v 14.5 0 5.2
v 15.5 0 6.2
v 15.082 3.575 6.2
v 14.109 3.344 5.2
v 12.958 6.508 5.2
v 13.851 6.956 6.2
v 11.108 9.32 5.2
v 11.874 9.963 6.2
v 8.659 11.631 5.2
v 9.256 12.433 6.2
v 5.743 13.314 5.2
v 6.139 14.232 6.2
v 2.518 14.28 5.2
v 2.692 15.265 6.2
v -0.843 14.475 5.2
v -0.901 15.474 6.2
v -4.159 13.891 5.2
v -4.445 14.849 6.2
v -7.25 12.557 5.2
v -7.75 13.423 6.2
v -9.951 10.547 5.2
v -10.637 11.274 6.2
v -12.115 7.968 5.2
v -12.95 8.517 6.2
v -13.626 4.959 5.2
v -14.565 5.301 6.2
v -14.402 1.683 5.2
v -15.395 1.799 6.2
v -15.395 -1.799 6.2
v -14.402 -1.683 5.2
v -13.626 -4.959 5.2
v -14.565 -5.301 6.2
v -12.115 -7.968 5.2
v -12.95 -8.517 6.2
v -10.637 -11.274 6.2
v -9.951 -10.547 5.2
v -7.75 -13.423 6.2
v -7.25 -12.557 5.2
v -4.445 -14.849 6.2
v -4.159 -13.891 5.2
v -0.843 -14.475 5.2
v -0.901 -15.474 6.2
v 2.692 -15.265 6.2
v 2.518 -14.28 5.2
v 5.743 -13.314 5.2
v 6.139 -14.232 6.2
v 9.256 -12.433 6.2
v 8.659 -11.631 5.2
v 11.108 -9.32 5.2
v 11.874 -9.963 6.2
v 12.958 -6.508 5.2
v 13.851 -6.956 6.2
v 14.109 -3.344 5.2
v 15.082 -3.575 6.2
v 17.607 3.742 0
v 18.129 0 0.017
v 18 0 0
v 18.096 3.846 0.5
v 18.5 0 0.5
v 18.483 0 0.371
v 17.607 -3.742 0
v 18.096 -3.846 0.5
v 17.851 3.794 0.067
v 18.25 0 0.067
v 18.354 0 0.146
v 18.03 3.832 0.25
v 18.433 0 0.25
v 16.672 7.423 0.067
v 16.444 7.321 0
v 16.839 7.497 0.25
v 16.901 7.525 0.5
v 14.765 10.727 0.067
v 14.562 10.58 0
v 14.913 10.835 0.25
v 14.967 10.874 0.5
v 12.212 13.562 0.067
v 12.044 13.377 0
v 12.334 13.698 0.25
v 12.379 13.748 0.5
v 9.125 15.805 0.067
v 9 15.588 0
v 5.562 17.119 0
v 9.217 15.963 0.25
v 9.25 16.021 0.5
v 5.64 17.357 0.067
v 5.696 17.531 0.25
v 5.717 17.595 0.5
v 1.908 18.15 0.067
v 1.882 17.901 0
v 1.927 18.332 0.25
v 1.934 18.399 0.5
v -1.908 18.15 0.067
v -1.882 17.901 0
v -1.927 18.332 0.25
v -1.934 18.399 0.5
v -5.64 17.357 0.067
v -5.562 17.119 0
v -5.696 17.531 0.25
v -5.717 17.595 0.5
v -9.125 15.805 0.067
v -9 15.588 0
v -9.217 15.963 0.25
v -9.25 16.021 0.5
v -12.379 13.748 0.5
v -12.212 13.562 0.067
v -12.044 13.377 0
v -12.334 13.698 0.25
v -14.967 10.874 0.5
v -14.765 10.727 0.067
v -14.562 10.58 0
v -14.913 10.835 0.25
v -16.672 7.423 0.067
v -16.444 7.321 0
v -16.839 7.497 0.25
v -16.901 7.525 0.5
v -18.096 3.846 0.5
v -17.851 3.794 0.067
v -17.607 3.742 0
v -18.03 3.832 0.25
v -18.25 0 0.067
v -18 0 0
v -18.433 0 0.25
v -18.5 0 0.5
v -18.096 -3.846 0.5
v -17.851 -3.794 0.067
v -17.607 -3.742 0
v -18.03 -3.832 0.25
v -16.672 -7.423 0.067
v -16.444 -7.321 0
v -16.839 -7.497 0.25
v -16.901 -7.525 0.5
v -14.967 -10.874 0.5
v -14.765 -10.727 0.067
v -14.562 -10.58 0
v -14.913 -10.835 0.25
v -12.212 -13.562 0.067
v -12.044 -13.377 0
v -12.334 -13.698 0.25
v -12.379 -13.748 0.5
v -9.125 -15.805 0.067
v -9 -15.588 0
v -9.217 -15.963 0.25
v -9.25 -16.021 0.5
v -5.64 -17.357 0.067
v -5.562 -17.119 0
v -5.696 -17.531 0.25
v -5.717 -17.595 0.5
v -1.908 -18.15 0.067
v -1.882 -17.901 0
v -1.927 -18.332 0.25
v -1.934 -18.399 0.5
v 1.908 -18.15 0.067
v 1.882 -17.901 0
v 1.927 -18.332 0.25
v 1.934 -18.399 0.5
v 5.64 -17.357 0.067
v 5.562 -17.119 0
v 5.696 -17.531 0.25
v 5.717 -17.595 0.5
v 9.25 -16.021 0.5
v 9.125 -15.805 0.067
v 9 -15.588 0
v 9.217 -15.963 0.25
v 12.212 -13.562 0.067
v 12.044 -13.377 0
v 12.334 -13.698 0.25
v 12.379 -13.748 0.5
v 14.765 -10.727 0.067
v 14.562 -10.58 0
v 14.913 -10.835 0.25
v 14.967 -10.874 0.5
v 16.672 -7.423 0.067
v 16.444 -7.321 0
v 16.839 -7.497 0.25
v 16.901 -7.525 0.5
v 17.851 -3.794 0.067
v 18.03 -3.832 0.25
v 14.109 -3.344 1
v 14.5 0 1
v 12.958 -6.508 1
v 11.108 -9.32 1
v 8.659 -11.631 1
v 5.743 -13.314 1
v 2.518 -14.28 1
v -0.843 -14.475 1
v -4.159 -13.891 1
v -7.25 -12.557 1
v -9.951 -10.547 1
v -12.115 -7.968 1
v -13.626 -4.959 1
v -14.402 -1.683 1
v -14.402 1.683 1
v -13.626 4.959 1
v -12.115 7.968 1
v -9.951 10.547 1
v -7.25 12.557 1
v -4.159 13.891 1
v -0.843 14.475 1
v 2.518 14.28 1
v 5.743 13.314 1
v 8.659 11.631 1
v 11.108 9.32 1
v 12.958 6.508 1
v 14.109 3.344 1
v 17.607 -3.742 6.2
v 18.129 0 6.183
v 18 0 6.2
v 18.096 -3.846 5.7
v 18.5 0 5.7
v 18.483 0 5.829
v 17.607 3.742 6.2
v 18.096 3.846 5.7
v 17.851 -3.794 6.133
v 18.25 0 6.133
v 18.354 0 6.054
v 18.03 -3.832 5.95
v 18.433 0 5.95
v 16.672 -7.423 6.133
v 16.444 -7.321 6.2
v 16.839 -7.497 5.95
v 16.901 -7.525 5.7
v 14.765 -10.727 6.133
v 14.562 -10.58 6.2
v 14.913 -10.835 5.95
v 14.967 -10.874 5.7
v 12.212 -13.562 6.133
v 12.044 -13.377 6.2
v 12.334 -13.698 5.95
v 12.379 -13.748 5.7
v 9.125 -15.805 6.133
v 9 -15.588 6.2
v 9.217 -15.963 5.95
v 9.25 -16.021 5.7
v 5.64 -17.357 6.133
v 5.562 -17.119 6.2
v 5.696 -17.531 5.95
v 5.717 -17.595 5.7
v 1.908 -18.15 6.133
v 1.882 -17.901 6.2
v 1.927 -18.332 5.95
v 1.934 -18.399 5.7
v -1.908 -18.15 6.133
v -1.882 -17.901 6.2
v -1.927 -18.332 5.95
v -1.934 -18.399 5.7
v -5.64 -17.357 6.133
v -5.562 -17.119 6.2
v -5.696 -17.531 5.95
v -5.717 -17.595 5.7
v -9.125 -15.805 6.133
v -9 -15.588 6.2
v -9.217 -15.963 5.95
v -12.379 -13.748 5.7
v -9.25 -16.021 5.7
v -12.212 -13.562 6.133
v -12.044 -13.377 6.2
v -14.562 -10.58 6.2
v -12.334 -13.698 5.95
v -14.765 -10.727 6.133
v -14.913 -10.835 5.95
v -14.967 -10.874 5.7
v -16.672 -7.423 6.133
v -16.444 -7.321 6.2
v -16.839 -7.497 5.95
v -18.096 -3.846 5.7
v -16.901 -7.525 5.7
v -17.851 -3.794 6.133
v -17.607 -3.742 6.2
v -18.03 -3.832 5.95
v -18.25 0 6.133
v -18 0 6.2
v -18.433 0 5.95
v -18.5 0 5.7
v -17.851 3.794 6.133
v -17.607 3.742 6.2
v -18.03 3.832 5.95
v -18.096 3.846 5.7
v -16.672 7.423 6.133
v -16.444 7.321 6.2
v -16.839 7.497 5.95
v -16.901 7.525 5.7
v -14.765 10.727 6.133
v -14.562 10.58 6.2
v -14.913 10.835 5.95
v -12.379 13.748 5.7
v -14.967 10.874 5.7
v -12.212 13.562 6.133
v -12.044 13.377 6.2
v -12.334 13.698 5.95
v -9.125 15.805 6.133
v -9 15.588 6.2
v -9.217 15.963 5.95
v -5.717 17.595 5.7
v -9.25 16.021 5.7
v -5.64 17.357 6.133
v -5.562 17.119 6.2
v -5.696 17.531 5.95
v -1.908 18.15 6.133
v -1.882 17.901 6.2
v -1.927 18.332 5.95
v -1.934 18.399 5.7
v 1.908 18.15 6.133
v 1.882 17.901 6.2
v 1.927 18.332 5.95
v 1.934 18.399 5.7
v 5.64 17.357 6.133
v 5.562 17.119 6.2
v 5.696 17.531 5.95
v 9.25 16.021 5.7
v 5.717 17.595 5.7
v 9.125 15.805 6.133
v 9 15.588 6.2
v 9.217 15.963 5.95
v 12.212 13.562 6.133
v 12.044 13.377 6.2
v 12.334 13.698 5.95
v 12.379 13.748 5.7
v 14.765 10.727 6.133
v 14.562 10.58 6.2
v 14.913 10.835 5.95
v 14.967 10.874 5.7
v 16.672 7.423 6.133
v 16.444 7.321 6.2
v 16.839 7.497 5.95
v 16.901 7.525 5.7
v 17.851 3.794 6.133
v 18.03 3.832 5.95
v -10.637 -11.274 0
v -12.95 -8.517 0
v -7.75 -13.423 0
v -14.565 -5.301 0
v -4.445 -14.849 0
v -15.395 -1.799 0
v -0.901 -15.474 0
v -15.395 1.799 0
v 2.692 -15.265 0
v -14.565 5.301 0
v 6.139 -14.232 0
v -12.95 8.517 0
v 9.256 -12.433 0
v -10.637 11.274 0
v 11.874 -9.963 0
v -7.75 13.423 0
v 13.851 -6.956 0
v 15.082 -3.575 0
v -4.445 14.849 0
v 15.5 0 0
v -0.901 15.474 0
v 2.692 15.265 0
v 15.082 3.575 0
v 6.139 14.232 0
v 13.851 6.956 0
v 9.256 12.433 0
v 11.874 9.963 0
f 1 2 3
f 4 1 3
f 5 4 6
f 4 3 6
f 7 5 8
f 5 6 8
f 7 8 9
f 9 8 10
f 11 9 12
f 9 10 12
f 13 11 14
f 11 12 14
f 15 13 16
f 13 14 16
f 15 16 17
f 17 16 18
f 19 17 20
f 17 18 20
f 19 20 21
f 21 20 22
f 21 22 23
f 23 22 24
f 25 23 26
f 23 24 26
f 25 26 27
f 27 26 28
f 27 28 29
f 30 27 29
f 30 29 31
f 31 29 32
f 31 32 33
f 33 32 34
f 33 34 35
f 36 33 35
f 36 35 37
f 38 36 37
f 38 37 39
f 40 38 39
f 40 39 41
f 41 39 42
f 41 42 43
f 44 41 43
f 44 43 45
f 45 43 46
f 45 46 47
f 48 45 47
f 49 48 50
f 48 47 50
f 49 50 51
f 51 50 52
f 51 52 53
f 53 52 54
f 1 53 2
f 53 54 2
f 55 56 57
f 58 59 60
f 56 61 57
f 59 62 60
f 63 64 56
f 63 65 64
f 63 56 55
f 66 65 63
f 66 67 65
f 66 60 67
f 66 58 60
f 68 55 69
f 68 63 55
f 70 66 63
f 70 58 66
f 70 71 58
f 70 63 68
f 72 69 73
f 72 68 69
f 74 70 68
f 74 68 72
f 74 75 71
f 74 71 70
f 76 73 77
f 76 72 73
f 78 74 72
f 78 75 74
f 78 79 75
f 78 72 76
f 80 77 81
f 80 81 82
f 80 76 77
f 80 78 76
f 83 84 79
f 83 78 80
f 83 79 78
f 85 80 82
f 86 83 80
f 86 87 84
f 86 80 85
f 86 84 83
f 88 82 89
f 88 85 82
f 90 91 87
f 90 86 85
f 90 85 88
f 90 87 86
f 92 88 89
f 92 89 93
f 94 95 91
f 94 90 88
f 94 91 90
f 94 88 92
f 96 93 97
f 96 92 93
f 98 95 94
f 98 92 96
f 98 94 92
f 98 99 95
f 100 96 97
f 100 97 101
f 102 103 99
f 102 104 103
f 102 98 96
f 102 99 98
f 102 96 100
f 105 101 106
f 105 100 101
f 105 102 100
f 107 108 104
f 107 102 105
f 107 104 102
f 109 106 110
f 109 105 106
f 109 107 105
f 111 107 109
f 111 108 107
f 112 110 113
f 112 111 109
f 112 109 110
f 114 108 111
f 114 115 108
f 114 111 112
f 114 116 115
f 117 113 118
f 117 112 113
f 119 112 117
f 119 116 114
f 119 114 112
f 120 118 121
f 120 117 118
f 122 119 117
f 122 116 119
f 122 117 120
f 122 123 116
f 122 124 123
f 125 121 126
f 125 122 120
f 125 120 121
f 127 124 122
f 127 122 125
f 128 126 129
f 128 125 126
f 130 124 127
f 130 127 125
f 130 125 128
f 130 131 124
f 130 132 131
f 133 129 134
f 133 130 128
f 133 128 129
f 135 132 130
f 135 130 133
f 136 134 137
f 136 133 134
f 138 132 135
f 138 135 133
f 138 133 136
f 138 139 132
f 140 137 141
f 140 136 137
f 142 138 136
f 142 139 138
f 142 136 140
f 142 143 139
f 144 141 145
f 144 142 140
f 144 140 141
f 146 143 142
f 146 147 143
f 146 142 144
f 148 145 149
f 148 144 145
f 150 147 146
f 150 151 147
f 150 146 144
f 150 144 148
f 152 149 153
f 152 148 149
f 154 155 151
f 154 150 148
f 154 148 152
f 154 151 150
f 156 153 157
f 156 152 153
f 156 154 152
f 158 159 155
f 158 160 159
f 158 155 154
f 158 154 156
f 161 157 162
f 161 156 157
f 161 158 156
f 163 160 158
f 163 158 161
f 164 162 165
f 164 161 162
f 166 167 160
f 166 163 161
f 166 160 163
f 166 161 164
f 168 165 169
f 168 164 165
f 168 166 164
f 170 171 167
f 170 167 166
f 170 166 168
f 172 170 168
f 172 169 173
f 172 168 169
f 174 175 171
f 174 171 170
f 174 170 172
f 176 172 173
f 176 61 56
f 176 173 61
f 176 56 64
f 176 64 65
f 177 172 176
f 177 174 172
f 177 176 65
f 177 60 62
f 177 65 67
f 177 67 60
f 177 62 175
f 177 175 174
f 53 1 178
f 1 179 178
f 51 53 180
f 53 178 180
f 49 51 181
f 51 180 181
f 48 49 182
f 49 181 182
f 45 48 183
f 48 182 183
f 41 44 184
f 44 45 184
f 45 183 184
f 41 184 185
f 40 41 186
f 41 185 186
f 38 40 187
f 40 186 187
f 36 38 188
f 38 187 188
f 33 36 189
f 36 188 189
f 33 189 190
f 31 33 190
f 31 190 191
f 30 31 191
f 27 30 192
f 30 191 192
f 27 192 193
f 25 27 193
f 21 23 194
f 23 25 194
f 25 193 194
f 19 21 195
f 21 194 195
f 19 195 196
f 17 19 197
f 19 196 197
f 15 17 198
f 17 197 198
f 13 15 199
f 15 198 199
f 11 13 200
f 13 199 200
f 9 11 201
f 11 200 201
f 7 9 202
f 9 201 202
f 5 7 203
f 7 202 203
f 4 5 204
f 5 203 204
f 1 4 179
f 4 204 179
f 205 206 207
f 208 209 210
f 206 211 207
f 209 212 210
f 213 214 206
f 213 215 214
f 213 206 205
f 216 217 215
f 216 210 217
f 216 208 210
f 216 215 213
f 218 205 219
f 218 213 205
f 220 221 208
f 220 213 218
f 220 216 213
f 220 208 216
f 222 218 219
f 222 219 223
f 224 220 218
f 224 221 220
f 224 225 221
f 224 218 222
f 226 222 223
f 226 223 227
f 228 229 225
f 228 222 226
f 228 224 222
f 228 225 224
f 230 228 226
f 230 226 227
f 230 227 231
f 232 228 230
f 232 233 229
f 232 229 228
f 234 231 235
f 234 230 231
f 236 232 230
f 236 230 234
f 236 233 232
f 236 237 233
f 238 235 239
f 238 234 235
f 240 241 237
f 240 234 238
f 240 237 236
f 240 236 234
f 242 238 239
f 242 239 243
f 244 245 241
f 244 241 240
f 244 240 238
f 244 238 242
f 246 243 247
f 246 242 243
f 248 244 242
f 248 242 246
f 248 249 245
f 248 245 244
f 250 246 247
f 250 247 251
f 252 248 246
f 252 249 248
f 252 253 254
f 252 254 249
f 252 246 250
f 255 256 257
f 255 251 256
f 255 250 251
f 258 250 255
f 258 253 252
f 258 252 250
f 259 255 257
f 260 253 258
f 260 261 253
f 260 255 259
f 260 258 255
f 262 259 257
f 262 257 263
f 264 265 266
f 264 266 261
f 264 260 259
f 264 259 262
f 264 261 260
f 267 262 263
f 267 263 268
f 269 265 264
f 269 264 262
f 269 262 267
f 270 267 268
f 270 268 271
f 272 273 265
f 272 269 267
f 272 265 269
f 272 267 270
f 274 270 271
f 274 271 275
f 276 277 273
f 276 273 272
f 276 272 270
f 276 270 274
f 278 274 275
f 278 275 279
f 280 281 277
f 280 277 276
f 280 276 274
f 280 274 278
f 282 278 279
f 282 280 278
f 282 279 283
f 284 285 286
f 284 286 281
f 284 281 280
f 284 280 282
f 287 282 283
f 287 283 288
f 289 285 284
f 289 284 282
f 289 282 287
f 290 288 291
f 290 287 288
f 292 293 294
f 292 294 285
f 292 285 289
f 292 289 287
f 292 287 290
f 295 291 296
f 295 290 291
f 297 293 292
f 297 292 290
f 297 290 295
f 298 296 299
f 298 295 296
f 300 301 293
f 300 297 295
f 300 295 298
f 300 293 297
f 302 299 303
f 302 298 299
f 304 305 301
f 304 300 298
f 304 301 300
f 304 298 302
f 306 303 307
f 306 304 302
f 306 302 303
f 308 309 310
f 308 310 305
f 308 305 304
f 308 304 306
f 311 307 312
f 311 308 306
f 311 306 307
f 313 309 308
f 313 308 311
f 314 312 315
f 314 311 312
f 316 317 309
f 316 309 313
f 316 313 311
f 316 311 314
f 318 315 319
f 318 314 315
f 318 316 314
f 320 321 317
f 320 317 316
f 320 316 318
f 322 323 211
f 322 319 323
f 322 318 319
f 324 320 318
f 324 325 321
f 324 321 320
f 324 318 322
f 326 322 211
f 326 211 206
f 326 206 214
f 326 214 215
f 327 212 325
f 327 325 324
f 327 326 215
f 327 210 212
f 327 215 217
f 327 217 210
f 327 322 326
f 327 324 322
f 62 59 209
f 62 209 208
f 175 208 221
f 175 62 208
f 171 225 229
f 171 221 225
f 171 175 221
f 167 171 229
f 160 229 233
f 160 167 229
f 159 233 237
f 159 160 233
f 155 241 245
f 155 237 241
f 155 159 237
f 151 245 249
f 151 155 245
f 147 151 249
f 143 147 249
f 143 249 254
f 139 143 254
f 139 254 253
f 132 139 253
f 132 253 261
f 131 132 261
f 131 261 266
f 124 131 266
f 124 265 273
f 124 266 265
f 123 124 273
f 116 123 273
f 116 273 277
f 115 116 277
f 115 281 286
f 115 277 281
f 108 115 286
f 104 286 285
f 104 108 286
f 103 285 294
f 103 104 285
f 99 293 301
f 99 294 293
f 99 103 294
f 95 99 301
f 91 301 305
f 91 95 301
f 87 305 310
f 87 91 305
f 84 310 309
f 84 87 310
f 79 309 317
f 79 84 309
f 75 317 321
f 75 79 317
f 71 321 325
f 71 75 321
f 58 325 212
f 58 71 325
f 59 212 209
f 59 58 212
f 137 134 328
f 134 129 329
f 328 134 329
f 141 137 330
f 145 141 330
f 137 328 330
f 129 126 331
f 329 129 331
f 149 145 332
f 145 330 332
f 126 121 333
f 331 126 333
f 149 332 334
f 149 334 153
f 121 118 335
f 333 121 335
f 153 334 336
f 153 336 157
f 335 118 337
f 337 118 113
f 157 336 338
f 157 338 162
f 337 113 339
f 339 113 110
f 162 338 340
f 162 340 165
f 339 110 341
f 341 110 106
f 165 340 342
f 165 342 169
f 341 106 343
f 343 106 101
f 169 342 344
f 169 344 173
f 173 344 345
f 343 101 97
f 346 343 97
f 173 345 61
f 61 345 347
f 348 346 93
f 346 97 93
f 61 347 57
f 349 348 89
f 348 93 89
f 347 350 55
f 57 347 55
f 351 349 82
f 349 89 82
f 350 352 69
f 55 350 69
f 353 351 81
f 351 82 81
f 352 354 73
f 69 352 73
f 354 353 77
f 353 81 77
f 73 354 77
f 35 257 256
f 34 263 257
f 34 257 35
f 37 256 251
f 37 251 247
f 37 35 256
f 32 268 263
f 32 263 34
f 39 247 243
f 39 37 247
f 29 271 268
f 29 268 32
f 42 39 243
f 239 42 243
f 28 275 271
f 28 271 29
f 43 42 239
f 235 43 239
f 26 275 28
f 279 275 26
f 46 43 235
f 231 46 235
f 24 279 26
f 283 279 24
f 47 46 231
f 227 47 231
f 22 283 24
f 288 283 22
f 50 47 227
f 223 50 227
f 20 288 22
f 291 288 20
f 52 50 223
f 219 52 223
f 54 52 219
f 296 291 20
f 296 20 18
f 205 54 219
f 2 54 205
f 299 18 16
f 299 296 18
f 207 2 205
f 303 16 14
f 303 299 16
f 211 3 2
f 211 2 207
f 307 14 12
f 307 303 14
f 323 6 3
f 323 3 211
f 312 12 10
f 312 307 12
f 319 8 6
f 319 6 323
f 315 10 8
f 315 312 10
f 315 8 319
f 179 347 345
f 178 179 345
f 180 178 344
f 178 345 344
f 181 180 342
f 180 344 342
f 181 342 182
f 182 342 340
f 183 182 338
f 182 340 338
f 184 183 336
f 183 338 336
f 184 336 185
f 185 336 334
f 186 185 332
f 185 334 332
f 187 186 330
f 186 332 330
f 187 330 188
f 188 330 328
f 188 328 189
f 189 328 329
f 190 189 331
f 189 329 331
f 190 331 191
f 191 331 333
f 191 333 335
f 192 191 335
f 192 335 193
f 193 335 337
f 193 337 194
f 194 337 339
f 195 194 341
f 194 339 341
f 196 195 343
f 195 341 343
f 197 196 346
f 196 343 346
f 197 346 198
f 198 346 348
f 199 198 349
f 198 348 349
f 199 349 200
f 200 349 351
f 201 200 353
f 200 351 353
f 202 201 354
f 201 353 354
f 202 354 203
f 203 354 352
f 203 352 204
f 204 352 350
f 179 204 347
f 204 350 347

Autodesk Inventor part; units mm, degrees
ref_plane "YZ Plane" through (0, 0, 0) normal (1, 0, 0) x (0, 1, 0)
ref_plane "XZ Plane" through (0, 0, 0) normal (0, 1, 0) x (-1, 0, 0)
ref_plane "XY Plane" through (0, 0, 0) normal (0, 0, 1) x (1, 0, 0)
sketch "Sketch1" plane through (0, 0, 0) normal (0, 0, 1) x (1, 0, 0)
  circle A0 centre (0, 0) radius 18.5
  circle A1 centre (0, 0) radius 14.5
  dimension "d0" = 37
  dimension "d1" = 29
extrude "Extrusion1" add sketch "Sketch1" along normal blind 6.2
thread "Thread1" size "M30x1.5" class "6H" standard "ANSI Metric M Profile" full length
chamfer "Chamfer1" distance 1 angle 45 2 edges at (-14.5, 0, 6.2) (-14.5, 0, 0)
fillet "Fillet1" radius 0.5 2 edges at (-18.5, 0, 6.2) (-18.5, 0, 0)
properties part number "13536_Ring"
